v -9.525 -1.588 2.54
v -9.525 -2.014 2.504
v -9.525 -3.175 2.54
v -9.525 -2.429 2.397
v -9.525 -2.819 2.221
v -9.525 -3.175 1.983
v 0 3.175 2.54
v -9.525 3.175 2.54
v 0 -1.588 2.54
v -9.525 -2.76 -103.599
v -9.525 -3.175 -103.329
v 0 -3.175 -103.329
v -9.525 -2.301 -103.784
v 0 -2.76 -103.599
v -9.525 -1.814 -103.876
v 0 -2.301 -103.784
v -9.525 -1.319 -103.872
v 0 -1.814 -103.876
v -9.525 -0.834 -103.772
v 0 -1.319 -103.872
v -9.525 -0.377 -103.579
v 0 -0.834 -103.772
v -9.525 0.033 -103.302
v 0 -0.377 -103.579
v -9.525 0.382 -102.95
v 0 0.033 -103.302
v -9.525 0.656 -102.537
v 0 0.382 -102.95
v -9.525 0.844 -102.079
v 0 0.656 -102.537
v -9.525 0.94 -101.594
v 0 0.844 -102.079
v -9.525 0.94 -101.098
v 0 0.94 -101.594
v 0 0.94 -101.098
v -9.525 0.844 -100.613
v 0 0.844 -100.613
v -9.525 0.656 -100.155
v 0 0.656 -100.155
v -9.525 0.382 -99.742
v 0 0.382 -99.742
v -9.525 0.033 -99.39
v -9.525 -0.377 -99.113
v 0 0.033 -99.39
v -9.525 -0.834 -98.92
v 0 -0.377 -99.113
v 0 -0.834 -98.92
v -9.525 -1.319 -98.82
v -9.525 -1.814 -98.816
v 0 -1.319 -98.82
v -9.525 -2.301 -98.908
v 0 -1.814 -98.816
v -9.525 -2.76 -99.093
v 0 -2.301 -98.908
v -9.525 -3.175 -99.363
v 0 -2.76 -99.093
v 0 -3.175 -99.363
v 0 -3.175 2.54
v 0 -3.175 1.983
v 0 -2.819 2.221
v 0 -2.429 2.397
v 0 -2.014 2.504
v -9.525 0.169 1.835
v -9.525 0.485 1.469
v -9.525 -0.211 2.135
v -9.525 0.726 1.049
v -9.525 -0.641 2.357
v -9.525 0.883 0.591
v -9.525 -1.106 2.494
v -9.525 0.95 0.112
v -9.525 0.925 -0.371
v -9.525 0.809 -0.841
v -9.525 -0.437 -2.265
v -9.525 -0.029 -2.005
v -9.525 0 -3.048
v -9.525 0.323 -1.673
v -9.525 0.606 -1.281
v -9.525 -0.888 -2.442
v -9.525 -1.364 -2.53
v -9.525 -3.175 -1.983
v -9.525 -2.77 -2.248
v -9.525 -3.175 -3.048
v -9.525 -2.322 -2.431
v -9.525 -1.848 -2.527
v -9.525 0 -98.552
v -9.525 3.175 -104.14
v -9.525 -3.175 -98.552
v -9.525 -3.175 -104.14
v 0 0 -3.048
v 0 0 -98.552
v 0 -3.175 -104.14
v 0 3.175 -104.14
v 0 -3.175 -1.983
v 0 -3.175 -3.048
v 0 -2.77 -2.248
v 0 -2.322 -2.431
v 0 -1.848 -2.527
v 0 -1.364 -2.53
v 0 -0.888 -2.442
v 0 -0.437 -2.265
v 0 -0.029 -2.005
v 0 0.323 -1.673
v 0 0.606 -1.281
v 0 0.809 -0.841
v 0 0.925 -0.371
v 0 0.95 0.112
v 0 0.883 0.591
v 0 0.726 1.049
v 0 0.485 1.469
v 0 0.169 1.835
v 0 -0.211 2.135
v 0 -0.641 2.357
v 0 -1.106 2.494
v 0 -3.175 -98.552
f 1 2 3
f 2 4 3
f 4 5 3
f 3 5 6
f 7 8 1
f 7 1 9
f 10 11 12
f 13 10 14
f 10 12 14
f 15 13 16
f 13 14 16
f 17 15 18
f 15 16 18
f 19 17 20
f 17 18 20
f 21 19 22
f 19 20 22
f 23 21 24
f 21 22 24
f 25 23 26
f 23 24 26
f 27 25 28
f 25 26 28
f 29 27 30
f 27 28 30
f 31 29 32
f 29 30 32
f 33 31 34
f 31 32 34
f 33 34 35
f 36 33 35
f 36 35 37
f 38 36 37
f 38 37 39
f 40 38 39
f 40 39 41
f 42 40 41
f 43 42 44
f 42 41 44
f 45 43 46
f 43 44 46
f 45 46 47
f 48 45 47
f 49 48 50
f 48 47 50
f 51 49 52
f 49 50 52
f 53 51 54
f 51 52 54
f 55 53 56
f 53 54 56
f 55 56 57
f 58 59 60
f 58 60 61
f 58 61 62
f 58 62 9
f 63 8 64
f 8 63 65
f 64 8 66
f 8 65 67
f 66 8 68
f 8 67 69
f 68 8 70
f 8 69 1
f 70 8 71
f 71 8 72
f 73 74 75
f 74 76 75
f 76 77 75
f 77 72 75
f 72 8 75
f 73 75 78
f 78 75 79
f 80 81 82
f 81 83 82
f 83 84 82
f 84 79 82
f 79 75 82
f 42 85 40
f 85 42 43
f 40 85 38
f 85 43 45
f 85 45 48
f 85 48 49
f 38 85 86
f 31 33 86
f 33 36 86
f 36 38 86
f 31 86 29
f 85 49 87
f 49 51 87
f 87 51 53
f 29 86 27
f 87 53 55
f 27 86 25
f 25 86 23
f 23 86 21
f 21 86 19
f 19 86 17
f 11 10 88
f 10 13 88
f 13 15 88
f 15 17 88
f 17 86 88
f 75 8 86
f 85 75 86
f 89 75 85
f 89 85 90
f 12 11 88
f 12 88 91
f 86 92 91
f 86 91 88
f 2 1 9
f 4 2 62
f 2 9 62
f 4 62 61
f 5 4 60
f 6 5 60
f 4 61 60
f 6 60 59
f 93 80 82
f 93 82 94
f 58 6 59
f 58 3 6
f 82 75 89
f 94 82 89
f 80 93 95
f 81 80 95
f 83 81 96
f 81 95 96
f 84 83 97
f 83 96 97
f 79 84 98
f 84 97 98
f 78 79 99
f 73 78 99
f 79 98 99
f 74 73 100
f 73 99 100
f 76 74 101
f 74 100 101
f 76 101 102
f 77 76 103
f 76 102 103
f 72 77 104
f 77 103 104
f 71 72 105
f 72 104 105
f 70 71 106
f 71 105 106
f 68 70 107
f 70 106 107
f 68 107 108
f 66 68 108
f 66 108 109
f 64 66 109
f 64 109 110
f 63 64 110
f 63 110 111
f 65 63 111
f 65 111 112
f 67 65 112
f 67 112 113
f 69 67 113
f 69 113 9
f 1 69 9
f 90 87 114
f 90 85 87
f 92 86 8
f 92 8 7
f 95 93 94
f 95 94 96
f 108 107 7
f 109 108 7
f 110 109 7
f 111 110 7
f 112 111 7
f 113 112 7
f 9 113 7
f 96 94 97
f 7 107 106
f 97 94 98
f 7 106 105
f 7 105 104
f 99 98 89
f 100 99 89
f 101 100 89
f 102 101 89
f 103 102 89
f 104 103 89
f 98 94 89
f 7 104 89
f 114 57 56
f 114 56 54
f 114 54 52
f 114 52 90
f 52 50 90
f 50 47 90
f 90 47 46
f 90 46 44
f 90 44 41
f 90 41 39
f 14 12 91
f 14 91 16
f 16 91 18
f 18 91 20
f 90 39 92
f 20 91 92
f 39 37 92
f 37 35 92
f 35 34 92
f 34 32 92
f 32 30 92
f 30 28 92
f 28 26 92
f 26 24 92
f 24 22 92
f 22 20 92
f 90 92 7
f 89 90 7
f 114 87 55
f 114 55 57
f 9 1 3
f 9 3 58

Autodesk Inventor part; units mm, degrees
ref_plane "YZ Plane" through (0, 0, 0) normal (1, 0, 0) x (0, 1, 0)
ref_plane "XZ Plane" through (0, 0, 0) normal (0, 1, 0) x (-1, 0, 0)
ref_plane "XY Plane" through (0, 0, 0) normal (0, 0, 1) x (1, 0, 0)
sketch "Sketch1" plane through (0, 0, 0) normal (0, 1, 0) x (-1, 0, 0)
  line L0 (0, 0) -> (9.525, 0)
  line L1 (9.525, 0) -> (9.525, -101.6)
  line L2 (9.525, -101.6) -> (0, -101.6)
  line L3 (0, -101.6) -> (0, 0)
  dimension "d0" = 9.525
  dimension "d1" = 101.6
extrude "Extrusion1" add sketch "Sketch1" along normal blind 3.175
sketch "Sketch2" plane through (0, 0, 0) normal (1, 0, 0) x (0, 0, -1)
  line L0 (0, 0) -> (0, 3.175) projected
  line L1 (101.6, 0) -> (101.6, 3.175) projected
  point P0 (0, 1.5875)
  point P1 (101.6, 1.5875)
sketch "Sketch3" plane through (0, 0, -101.6) normal (0, 0, -1) x (-1, 0, 0)
  line L0 (9.525, 3.175) -> (0, 3.175) projected
  line L1 (0, 0) -> (9.525, 0) projected
  line L2 (9.525, 3.175) -> (0, 3.175)
  line L3 (0, 3.175) -> (0, 0)
  line L4 (0, 0) -> (9.525, 0)
  line L5 (9.525, 0) -> (9.525, 3.175)
extrude "Extrusion2" add sketch "Sketch3" along normal blind 2.54
sketch "Sketch4" plane through (0, 0, 0) normal (0, -1, 0) x (1, 0, 0)
  point P0 (0, 0)
sketch "Sketch5" plane through (-9.525, 0, 0) normal (0, 0, 1) x (1, 0, 0)
  line L0 (0, 3.175) -> (9.525, 3.175) projected
  line L1 (0, 0) -> (9.525, 0)
  line L2 (9.525, 0) -> (9.525, 3.175)
  line L3 (9.525, 3.175) -> (0, 3.175)
  line L4 (0, 3.175) -> (0, 0)
extrude "Extrusion3" add sketch "Sketch5" along normal blind 2.54
sketch "Sketch6" plane through (0, 0, 0) normal (0, -1, 0) x (1, 0, 0)
  line L0 (0, -104.14) -> (0, 2.54) projected
  line L1 (-9.525, 2.54) -> (-9.525, -104.14) projected
  line L2 (0, 2.54) -> (-9.525, 2.54)
  line L3 (-9.525, 2.54) -> (-9.525, -3.048)
  line L4 (-9.525, -3.048) -> (0, -3.048)
  line L5 (0, -3.048) -> (0, 2.54)
  line L6 (0, -104.14) -> (-9.525, -104.14)
  line L7 (-9.525, -104.14) -> (-9.525, -98.552)
  line L8 (-9.525, -98.552) -> (0, -98.552)
  line L9 (0, -98.552) -> (0, -104.14)
  point P0 (0, 0)
  dimension "d8" = 5.588
  dimension "d9" = 5.588
extrude "Extrusion4" add sketch "Sketch6" along normal blind 3.175 contours L6 L1 L8 L0 | L4 L1 L2 L0
sketch "Sketch7" plane through (-9.525, 3.175, -104.14) normal (-1, 0, 0) x (0, 0, 1)
  circle A0 centre (2.794, -4.7625) radius 2.54
  circle A1 centre (104.14, -4.7625) radius 2.54
  circle A2 centre (2.794, -4.7625) radius 2.54
  circle A3 centre (104.14, -4.7625) radius 2.54
  point P0 (104.14, -3.175)
  dimension "d12" = 5.08
hole "Hole1" at (-9.525, -1.5875, -101.346) at (-9.525, -1.5875, 0) direction (1, 0, 0) diameter 5.08 depth 25.4 tip angle 118
properties part number "Horizontal Bar (9.25)"
